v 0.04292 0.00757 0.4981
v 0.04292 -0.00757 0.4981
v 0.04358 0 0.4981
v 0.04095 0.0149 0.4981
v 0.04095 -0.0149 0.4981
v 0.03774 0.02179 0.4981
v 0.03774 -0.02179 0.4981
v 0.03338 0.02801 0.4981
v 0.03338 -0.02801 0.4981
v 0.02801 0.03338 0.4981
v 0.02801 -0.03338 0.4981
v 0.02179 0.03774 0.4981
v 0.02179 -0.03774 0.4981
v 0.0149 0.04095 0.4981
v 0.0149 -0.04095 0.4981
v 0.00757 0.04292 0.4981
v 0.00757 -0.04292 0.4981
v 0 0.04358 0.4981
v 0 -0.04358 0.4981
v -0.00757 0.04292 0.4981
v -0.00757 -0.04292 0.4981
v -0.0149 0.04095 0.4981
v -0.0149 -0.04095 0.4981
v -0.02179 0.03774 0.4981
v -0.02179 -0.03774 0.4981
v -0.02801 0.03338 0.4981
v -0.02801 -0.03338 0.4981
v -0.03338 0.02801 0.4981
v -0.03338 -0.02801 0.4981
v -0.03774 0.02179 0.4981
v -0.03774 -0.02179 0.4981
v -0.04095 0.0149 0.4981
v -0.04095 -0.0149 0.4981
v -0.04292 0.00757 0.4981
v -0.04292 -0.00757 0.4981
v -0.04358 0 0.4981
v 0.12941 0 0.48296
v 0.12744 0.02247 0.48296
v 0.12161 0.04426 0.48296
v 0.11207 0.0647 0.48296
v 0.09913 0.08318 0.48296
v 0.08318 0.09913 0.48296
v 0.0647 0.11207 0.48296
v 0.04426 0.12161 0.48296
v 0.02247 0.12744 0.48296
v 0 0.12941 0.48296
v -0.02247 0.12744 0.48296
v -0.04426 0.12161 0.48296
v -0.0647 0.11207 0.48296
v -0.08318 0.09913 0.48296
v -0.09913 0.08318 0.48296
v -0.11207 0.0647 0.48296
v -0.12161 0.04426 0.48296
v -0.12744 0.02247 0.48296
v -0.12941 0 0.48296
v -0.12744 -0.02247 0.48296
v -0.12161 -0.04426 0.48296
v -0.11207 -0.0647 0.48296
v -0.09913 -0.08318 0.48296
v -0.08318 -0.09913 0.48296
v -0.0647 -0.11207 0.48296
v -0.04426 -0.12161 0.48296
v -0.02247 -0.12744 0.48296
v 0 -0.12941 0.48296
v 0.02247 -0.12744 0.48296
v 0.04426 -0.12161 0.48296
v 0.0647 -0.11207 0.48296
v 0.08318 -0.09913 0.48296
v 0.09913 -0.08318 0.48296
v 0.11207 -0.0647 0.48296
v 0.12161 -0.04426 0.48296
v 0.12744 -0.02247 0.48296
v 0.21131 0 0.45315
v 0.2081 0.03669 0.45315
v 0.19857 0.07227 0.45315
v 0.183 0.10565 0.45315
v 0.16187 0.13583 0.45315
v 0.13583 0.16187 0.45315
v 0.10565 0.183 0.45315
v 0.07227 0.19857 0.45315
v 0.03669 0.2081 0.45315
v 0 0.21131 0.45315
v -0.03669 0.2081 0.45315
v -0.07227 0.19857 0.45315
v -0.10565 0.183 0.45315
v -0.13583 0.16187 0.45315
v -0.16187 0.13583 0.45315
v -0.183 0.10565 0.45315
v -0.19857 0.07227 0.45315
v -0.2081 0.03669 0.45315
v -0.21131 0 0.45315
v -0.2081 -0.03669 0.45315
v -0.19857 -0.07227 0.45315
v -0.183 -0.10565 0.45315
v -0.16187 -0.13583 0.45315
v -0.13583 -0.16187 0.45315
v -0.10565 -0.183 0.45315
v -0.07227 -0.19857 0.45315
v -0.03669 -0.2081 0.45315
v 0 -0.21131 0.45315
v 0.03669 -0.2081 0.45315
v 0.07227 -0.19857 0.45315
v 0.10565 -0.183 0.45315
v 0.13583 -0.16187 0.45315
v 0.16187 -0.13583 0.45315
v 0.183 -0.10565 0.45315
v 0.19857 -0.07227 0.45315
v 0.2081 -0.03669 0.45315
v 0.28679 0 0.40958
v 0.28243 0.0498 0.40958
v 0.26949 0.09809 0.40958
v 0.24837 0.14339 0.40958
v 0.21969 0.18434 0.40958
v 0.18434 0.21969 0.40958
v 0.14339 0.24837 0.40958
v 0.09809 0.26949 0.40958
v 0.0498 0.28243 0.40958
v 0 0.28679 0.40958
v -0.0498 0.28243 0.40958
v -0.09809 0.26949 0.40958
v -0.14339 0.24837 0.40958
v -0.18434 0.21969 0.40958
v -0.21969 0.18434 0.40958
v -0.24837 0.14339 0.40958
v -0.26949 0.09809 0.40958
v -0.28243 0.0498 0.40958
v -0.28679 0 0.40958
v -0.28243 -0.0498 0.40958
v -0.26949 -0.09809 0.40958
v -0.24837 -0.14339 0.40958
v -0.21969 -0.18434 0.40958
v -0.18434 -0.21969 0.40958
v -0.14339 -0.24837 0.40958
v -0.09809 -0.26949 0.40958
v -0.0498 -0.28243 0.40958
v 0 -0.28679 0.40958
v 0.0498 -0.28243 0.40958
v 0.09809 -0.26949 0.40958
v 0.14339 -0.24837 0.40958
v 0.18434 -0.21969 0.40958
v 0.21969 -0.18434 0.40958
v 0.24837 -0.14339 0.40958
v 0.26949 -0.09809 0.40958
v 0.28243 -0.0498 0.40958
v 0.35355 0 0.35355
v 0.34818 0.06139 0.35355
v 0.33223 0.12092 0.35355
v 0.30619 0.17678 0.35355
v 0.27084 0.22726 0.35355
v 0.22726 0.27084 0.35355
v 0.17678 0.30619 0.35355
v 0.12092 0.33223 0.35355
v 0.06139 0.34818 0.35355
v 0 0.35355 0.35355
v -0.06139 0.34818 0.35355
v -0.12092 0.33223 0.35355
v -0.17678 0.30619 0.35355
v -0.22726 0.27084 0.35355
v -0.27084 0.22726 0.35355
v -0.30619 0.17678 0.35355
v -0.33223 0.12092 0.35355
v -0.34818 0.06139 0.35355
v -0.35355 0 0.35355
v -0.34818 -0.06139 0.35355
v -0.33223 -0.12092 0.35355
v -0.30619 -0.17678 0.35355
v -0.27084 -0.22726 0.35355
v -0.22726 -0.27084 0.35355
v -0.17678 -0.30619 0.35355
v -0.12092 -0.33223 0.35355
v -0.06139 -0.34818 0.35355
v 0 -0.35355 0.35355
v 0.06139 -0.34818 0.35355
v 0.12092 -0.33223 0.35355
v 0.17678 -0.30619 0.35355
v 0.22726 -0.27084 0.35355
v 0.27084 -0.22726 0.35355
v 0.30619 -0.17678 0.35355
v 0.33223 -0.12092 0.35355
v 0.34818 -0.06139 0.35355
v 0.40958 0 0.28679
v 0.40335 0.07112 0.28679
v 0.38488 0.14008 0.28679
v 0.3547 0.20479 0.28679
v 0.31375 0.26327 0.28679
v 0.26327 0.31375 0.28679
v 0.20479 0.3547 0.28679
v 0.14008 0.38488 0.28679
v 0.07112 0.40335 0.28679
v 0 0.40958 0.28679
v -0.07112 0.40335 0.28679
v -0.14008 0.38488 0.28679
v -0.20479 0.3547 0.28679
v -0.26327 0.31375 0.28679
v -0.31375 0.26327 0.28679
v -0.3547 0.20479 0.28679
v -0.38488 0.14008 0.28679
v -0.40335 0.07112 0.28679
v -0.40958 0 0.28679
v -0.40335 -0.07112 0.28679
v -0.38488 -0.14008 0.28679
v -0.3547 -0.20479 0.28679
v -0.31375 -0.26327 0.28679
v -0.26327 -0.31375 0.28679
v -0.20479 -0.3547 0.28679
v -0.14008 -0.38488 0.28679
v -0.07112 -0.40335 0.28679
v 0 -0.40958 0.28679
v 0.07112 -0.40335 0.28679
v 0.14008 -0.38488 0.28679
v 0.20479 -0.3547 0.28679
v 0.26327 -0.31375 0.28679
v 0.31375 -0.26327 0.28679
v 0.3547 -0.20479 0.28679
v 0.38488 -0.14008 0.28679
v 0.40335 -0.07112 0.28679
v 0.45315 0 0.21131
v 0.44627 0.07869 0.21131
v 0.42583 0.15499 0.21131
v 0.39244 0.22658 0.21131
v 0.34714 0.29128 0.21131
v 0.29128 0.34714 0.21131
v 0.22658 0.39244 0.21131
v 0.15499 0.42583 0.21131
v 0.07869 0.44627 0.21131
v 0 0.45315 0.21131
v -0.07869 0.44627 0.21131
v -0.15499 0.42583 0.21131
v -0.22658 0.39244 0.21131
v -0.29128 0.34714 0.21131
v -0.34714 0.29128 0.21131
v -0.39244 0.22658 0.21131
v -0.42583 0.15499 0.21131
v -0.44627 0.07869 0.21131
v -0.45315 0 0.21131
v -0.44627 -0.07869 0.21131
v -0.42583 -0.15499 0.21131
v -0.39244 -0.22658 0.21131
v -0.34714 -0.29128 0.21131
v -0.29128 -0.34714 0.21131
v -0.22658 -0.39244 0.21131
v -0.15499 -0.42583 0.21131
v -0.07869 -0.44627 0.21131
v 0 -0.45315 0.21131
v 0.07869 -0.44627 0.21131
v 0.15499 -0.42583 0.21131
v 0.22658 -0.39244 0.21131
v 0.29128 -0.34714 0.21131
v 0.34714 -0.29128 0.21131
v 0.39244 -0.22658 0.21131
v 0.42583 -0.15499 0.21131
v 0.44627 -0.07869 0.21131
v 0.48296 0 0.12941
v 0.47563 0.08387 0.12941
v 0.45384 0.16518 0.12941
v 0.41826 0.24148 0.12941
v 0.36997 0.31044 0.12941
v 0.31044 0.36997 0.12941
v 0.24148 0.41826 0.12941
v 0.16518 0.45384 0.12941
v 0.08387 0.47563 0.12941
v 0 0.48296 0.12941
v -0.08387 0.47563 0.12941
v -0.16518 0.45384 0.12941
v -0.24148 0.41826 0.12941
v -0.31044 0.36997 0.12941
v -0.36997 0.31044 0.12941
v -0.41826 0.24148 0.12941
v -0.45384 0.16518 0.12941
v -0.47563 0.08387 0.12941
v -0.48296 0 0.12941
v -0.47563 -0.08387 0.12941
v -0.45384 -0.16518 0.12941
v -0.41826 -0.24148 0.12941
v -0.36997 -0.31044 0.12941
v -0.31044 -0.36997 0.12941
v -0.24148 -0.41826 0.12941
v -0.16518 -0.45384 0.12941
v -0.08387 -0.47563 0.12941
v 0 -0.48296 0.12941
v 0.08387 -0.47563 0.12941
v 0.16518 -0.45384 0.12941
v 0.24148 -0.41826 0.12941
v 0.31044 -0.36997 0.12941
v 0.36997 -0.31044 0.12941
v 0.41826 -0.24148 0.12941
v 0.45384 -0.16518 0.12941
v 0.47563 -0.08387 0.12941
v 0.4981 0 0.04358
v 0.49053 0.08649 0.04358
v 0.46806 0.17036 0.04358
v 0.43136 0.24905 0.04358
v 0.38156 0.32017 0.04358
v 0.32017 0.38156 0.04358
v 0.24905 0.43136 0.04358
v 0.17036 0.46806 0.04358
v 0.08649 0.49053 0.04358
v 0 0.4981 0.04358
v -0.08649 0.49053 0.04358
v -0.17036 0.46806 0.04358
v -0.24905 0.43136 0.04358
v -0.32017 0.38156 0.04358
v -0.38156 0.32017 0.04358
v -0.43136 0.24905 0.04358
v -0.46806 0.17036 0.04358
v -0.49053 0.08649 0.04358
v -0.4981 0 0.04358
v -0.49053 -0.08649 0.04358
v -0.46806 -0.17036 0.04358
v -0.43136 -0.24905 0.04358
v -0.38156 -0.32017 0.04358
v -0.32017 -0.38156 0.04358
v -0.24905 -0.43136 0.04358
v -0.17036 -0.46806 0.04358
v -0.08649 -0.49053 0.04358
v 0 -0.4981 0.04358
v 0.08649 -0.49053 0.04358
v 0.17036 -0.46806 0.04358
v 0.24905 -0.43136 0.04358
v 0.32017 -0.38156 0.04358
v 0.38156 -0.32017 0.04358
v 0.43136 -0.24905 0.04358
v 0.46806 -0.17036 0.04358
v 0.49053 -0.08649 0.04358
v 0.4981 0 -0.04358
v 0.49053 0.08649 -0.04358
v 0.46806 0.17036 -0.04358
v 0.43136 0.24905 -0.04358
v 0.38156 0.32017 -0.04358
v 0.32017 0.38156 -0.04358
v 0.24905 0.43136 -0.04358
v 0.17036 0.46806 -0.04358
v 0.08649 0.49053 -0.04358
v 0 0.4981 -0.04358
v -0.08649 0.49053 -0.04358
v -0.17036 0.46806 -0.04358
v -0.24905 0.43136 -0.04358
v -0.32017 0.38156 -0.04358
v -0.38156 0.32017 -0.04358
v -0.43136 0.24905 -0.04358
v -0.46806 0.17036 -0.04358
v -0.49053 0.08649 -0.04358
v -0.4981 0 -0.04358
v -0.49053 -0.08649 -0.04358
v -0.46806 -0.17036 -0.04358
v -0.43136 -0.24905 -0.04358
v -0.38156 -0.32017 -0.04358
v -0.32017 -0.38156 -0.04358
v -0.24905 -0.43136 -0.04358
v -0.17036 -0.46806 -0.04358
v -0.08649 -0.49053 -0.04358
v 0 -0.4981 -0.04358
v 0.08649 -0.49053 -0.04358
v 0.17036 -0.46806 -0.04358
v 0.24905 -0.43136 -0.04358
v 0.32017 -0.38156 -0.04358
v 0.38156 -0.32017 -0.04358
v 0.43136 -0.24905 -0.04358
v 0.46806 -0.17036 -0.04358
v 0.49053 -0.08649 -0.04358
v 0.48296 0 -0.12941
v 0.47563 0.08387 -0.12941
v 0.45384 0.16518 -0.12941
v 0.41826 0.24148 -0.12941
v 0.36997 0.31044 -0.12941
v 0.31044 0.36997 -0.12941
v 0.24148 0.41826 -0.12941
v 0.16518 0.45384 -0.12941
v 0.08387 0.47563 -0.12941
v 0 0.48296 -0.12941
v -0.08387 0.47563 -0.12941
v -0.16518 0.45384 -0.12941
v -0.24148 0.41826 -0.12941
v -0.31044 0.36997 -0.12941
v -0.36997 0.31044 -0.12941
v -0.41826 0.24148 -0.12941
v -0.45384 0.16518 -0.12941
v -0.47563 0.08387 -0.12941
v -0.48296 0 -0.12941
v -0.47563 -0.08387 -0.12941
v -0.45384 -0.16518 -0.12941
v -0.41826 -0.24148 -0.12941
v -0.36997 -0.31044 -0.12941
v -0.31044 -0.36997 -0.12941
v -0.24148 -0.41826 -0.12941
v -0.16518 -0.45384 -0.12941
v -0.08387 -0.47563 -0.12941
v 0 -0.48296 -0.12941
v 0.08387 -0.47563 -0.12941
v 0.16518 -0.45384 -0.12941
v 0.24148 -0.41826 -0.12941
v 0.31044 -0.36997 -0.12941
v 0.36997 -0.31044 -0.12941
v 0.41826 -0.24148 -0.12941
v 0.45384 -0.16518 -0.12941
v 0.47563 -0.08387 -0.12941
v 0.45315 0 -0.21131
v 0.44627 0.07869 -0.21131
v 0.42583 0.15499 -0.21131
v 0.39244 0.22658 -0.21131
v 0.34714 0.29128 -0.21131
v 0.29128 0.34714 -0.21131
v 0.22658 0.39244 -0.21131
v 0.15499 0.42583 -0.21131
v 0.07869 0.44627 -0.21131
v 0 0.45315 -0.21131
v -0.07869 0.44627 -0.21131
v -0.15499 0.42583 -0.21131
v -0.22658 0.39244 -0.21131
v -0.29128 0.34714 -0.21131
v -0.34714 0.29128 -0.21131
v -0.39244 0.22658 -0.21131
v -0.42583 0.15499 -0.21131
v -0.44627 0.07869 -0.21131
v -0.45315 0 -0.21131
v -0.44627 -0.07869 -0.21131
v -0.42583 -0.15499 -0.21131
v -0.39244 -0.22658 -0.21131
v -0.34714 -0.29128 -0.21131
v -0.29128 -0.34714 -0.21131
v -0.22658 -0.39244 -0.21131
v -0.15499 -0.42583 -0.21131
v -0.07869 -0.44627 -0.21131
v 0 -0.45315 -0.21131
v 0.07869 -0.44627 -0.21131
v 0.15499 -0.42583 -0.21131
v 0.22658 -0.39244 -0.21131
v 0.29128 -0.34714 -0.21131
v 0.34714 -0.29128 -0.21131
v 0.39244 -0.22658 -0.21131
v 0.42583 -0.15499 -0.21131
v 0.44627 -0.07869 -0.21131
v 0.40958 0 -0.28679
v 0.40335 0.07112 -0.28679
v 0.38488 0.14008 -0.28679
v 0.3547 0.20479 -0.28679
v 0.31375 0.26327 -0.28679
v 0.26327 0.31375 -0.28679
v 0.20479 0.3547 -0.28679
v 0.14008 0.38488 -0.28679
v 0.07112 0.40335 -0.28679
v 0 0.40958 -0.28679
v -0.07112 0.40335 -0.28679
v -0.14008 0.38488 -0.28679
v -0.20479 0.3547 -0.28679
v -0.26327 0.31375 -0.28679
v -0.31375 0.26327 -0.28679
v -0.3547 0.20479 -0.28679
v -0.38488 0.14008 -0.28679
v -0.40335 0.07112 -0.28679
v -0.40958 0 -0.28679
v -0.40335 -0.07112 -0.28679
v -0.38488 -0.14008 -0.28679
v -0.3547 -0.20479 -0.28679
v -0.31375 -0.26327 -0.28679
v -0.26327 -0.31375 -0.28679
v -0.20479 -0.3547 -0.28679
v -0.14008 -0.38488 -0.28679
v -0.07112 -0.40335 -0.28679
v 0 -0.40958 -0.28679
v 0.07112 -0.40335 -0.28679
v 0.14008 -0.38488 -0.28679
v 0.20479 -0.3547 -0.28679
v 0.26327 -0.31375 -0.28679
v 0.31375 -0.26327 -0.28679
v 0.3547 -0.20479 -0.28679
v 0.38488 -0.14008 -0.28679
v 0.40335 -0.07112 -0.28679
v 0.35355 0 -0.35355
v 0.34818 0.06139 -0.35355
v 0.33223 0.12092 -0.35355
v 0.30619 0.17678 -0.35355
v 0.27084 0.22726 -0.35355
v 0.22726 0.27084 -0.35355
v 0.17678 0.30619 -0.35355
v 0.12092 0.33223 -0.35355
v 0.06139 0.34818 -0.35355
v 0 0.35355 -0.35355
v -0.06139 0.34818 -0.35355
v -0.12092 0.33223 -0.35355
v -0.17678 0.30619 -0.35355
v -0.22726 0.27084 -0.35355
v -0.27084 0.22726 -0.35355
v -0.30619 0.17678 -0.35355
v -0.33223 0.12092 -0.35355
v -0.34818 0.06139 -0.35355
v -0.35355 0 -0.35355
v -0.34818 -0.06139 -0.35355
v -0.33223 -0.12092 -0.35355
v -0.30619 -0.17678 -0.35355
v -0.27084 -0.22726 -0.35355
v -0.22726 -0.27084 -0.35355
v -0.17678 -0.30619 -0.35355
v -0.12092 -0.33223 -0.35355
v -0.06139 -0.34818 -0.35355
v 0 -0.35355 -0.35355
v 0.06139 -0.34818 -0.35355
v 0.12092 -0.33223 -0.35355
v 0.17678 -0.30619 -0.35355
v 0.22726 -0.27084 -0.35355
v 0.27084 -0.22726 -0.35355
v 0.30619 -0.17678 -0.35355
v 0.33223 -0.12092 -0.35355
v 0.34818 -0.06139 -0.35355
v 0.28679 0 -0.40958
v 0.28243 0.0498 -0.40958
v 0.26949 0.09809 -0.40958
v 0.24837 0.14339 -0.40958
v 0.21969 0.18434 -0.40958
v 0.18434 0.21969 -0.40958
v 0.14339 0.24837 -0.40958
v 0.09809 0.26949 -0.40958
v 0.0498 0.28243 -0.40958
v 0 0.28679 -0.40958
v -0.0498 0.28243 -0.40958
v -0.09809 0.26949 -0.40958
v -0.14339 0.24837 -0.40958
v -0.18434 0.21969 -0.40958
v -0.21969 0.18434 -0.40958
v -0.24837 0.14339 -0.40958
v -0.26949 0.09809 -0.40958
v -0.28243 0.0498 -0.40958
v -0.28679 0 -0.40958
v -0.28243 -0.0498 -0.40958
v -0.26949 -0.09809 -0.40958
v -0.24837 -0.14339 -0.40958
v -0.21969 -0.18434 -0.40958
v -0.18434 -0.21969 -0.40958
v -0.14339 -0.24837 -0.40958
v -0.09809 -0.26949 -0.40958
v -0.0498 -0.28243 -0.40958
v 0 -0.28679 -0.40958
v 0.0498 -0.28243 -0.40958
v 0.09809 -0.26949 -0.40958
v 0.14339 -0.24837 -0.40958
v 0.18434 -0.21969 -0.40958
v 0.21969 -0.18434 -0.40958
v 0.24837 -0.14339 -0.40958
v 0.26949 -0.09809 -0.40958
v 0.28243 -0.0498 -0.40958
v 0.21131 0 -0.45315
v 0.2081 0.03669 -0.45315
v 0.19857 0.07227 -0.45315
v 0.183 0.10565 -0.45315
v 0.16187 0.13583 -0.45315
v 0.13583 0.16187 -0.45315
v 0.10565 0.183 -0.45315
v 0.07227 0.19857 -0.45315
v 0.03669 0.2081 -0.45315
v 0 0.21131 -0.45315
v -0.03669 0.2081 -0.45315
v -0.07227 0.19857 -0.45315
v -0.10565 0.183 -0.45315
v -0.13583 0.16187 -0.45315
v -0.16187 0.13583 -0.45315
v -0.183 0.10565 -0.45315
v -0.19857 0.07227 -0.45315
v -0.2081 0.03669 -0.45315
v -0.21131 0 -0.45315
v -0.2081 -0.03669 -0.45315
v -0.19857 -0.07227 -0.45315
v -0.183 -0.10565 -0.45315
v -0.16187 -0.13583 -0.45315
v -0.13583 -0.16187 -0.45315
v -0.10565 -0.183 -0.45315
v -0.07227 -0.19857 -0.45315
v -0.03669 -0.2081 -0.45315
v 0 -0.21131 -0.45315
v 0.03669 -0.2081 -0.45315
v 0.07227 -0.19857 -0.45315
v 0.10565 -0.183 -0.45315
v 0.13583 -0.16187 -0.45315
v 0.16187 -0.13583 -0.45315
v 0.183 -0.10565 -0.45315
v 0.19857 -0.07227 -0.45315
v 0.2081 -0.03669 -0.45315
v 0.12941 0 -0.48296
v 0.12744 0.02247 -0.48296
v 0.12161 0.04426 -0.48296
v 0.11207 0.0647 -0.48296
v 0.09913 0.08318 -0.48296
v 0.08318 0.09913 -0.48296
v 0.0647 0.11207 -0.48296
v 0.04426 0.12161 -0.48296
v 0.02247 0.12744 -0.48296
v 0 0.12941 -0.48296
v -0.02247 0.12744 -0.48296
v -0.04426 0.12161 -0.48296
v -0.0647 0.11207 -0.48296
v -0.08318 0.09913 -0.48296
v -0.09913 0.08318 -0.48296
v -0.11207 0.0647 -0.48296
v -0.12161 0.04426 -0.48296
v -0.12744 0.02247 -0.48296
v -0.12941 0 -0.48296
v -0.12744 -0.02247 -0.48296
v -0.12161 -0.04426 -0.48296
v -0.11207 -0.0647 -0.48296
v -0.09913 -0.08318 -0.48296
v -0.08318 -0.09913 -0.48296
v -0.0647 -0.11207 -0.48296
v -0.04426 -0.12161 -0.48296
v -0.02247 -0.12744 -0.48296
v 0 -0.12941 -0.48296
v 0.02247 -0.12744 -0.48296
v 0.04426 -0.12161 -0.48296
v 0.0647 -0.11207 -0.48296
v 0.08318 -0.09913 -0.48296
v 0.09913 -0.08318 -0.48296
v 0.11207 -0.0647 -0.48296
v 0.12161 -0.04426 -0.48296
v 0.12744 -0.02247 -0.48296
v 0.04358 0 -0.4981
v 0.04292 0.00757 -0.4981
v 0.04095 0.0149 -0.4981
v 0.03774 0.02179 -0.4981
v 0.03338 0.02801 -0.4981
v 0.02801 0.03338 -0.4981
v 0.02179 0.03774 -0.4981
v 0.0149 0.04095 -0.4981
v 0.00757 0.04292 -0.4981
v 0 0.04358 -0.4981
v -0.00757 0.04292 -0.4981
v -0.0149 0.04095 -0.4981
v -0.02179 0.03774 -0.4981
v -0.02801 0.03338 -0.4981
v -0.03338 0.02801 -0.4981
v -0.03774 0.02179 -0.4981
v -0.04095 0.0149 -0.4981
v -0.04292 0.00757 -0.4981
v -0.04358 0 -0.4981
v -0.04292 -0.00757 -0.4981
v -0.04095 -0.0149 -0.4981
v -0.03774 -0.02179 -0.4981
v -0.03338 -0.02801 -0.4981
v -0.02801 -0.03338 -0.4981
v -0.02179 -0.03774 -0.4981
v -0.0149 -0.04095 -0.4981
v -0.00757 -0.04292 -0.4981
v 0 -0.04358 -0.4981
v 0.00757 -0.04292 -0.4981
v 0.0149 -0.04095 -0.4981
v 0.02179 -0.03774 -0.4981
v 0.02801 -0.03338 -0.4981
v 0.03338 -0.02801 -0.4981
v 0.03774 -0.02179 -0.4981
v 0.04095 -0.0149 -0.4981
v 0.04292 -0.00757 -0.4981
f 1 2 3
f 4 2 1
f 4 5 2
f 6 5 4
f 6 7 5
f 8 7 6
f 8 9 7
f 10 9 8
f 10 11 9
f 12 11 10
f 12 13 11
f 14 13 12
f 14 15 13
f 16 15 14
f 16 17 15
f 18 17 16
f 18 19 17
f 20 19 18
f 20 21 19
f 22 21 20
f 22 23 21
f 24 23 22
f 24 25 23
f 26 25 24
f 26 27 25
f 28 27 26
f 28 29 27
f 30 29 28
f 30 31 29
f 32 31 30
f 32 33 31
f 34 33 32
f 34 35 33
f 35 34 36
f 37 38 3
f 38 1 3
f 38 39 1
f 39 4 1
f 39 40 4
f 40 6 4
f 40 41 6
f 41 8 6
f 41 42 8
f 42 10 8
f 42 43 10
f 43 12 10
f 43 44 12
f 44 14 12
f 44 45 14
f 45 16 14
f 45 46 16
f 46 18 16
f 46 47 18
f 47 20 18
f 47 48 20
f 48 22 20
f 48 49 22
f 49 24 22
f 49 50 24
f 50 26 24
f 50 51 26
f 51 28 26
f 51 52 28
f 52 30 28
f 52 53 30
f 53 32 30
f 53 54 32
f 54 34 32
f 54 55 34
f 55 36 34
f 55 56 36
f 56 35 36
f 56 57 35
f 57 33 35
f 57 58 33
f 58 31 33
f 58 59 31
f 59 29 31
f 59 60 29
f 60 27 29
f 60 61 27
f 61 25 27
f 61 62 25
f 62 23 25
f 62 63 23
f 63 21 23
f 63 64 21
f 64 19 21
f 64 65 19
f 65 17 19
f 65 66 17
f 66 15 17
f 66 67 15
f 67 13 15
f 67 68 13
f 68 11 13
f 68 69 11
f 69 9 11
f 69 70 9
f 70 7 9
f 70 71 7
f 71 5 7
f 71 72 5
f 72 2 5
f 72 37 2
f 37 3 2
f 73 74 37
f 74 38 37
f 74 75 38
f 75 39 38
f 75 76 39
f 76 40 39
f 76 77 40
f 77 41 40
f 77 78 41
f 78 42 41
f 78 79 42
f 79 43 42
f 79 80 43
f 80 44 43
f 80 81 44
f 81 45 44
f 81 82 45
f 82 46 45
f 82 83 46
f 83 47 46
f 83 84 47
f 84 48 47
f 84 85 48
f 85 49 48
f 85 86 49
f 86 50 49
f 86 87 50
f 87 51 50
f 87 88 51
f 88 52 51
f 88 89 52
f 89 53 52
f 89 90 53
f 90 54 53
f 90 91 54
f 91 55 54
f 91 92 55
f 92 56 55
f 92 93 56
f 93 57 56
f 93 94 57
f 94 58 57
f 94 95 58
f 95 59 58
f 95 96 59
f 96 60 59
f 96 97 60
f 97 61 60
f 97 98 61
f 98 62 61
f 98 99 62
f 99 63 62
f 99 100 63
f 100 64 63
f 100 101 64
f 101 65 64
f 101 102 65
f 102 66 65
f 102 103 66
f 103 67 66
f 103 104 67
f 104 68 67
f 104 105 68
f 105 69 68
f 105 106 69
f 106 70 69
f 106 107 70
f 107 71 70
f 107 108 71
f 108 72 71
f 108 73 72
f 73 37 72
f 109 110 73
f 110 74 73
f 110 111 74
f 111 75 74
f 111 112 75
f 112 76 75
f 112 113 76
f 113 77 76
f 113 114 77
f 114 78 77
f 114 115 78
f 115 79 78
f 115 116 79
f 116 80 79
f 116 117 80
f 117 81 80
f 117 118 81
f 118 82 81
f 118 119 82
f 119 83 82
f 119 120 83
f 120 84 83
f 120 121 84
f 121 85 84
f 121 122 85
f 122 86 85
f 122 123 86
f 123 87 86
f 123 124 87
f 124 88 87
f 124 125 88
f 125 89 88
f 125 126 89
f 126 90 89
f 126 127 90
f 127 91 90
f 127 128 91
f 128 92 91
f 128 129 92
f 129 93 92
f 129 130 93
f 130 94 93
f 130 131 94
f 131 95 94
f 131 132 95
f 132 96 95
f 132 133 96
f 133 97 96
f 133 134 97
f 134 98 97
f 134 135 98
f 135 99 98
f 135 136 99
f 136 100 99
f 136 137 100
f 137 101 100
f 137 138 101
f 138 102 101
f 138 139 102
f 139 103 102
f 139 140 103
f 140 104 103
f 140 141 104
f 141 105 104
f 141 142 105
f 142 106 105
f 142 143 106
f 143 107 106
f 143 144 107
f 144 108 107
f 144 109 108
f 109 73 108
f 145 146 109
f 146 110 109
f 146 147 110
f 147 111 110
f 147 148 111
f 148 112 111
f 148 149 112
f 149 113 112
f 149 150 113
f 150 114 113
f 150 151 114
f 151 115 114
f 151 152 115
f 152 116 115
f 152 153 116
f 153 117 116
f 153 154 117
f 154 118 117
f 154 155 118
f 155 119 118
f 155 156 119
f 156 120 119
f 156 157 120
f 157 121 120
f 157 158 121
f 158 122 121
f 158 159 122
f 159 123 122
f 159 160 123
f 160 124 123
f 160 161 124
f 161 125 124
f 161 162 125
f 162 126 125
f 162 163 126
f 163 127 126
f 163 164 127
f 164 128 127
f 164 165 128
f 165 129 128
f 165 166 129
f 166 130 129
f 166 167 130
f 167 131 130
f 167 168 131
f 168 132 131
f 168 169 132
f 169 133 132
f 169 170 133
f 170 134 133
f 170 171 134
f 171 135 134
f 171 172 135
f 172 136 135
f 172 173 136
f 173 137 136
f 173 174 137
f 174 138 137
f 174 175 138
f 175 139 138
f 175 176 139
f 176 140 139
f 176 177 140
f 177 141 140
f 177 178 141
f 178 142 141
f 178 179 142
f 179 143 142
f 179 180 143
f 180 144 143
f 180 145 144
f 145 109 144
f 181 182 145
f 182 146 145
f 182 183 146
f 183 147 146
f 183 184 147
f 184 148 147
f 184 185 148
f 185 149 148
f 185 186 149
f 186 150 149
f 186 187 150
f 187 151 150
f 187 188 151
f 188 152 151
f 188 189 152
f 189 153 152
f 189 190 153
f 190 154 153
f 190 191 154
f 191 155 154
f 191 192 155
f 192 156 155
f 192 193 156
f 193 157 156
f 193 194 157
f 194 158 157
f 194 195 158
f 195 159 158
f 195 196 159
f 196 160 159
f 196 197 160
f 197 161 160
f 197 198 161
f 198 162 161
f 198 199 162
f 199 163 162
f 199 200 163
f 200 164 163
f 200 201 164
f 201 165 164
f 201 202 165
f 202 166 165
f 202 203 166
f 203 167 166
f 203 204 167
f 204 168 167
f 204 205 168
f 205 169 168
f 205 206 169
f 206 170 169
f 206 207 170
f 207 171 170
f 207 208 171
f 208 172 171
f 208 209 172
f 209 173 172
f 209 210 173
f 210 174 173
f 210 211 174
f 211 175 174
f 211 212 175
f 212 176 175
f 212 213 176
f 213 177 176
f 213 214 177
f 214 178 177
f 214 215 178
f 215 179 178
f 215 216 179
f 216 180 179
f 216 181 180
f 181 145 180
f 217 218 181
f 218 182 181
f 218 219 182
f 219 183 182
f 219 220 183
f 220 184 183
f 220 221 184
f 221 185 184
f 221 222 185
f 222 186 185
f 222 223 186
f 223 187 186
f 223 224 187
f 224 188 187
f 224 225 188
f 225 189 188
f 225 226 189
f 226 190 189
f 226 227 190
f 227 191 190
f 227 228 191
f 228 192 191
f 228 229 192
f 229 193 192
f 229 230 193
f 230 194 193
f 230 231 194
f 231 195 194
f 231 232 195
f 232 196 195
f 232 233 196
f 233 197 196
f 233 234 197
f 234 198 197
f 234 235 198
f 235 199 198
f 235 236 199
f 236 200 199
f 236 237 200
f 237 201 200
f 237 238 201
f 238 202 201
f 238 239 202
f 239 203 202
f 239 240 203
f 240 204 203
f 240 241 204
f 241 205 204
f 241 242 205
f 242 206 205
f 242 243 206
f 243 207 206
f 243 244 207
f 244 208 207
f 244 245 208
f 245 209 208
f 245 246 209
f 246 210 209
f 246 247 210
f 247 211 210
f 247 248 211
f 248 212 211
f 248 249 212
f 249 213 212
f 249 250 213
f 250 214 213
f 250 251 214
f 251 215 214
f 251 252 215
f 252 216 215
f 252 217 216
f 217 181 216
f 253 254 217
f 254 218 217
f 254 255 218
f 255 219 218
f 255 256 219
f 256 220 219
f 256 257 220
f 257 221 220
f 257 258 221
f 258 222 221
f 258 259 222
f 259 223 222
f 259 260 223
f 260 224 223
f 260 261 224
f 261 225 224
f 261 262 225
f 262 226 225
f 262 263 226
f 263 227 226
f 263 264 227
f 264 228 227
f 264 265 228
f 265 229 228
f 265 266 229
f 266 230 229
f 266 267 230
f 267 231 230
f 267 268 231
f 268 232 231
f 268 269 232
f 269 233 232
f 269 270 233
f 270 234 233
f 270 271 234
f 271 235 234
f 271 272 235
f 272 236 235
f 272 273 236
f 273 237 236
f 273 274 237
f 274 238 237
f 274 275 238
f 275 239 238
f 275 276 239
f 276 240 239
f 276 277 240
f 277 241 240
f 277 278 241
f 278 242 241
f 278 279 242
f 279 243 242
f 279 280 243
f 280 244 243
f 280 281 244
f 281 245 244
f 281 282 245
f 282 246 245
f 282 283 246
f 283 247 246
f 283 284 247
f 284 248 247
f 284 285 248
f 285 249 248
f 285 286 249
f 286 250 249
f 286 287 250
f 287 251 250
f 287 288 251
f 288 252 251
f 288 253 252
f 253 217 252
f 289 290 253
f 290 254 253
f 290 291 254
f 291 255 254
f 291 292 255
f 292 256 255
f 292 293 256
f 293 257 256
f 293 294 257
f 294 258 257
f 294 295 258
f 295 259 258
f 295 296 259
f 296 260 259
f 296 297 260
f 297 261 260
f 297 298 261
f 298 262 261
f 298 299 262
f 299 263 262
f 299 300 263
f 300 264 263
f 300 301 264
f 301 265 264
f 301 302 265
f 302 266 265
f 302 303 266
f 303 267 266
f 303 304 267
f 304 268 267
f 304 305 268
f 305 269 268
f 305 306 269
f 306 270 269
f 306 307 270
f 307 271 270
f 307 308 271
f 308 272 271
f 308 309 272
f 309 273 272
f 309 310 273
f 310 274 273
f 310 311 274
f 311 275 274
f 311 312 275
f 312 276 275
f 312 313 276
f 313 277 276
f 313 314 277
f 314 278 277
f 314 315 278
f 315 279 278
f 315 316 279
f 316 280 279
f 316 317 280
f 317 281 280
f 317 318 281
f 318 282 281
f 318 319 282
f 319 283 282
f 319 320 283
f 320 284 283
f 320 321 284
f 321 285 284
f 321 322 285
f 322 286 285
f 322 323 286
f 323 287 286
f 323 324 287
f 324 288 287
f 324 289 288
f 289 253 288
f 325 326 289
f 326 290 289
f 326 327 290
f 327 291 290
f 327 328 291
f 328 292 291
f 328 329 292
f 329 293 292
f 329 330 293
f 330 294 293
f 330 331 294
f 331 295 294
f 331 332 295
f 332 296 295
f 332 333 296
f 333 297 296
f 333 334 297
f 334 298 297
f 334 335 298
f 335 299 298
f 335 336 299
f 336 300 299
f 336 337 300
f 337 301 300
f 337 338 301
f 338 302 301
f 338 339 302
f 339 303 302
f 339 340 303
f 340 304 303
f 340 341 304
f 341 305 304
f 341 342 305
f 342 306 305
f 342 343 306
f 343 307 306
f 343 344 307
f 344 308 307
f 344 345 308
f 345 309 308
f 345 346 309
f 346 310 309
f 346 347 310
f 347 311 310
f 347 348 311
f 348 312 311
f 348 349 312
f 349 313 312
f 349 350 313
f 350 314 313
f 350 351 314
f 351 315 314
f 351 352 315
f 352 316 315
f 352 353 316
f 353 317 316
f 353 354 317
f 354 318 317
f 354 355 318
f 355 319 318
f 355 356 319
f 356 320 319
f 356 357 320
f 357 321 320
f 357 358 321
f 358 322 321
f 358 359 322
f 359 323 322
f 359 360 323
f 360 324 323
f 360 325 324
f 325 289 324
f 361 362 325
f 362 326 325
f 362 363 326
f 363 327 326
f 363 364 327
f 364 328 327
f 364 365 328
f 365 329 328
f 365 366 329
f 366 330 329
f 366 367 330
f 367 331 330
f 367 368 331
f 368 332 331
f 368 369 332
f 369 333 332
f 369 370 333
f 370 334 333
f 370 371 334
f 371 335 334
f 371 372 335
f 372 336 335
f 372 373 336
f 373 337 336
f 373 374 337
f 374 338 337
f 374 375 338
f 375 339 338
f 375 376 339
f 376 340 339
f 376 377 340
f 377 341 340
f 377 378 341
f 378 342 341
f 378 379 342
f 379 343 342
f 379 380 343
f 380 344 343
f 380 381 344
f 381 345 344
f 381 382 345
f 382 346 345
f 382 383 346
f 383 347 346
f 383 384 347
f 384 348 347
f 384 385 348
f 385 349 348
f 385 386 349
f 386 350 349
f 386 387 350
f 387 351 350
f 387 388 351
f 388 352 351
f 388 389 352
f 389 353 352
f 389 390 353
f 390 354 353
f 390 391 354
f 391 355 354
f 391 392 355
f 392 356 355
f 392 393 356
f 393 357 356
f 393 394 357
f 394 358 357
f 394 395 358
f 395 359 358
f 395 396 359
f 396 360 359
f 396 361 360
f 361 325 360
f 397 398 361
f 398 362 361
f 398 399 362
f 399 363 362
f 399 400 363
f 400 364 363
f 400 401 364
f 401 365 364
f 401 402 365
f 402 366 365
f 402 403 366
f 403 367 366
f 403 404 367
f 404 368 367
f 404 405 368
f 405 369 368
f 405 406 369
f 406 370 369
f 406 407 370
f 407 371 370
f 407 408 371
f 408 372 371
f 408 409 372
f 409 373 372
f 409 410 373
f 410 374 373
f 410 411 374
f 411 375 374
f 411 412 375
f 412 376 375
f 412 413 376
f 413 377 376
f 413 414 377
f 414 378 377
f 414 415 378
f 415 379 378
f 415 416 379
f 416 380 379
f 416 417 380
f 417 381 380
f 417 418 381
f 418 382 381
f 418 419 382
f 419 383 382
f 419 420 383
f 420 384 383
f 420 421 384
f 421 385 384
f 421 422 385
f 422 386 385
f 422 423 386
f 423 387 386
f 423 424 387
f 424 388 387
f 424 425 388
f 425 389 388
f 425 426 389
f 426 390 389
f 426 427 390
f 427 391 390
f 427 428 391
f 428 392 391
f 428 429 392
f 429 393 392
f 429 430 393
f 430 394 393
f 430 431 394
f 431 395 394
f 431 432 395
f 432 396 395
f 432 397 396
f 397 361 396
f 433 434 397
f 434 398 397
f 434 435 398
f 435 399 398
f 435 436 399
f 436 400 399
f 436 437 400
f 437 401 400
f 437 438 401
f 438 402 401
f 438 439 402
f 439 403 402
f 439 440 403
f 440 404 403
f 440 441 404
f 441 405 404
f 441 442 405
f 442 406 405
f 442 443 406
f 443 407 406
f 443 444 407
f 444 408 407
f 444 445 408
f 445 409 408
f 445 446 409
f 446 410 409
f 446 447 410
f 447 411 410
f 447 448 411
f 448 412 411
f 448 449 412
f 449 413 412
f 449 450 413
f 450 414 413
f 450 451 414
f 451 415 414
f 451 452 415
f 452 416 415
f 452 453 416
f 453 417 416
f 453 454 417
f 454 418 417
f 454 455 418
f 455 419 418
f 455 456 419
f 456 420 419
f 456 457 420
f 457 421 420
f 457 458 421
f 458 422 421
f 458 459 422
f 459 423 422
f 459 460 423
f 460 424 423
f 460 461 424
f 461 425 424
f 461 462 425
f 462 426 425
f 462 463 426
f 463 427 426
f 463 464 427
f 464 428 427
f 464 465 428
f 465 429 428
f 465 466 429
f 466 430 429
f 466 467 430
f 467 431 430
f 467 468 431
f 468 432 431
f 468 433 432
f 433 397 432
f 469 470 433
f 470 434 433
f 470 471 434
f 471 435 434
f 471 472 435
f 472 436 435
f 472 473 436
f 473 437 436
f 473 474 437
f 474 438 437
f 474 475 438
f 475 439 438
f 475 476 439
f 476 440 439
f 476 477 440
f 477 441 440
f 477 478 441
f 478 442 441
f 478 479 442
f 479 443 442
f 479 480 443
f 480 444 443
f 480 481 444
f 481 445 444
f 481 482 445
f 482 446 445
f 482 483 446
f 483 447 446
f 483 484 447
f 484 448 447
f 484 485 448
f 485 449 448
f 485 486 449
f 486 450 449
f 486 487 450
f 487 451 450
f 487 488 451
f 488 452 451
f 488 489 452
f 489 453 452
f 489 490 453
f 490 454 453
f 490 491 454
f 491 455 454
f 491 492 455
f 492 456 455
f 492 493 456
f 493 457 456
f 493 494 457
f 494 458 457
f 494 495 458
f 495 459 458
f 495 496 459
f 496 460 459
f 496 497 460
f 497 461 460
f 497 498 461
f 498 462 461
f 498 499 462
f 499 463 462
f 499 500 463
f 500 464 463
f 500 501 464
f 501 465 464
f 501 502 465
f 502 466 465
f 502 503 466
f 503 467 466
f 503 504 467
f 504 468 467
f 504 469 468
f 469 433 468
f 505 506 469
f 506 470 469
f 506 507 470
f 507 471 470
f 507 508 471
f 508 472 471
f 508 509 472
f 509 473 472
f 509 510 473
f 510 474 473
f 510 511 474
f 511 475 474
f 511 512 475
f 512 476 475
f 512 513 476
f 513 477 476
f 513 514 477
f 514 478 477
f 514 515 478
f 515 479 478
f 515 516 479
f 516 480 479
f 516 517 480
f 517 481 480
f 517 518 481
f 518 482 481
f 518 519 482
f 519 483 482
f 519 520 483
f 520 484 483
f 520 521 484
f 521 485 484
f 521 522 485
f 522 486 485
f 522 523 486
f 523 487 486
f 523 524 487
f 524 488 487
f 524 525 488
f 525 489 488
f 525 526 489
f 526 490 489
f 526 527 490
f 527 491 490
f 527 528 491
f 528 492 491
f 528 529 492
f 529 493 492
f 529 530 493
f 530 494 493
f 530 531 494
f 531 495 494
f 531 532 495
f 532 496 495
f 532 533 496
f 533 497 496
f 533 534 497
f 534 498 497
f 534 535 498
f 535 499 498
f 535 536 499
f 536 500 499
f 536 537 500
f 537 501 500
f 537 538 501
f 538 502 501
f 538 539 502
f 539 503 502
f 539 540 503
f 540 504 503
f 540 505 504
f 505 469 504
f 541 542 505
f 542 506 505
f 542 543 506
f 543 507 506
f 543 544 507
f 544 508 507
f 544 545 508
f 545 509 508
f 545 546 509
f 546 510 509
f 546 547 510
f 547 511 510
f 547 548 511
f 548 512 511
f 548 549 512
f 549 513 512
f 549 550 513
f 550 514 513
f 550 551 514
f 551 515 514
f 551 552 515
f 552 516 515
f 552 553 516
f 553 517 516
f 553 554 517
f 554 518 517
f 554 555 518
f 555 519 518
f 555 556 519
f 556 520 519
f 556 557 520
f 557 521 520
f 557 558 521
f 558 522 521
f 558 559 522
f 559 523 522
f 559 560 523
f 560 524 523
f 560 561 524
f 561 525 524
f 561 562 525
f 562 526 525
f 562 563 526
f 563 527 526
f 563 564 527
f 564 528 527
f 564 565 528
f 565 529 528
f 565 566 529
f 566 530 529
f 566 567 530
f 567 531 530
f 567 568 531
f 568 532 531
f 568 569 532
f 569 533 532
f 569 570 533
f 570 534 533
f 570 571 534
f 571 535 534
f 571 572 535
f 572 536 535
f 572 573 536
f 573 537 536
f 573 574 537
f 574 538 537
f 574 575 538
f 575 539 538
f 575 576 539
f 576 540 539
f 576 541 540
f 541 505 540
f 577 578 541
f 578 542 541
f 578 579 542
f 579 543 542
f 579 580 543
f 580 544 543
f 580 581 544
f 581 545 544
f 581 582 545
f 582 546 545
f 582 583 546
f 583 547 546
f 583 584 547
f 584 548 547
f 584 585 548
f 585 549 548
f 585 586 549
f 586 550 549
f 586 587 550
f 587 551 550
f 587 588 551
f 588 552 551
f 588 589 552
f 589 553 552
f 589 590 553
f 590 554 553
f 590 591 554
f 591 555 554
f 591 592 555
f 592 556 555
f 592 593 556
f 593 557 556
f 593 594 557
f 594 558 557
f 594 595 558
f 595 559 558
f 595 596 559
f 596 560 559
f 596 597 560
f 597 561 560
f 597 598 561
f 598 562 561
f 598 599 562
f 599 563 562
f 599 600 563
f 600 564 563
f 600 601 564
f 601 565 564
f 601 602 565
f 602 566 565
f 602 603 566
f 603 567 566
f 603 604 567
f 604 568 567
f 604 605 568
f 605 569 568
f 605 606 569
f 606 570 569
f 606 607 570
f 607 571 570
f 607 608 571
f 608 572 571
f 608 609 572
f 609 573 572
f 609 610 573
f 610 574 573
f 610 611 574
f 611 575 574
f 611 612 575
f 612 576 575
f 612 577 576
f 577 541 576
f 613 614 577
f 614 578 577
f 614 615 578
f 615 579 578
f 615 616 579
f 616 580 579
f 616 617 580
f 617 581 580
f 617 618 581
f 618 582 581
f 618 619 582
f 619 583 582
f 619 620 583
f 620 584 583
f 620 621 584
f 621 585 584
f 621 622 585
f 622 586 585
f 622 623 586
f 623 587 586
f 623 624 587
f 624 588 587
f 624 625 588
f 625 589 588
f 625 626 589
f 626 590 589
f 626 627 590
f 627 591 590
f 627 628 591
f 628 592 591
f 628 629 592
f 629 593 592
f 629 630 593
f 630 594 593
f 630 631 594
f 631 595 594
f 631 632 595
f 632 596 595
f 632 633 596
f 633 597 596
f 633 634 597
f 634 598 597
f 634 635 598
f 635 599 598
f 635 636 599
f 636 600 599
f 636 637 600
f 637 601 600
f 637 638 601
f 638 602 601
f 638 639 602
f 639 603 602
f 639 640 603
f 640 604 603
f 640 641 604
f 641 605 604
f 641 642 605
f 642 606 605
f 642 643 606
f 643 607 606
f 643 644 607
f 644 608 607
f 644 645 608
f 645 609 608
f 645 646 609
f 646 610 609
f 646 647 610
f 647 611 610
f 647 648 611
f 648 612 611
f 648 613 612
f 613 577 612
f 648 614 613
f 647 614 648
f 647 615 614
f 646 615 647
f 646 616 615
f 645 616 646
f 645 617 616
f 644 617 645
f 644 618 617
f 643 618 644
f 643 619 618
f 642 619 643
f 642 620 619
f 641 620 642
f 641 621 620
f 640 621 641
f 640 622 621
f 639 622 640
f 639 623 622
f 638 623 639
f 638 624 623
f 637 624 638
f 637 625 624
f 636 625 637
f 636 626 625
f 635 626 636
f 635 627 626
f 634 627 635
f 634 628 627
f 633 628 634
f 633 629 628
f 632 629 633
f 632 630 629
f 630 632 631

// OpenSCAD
$fn=36;

sphere(d=1);

*Rings();
*InnerSpherical();

module Rings() {
    Ring(1,0.1,0.1);
    rotate([90,0,0])
    Ring(1,0.1,0.1);
    rotate([0,90,0])
    Ring(1,0.1,0.1);
}

module InnerSpherical() {
    sphere(d=0.75);
    rotate([90,0,0])
    cylinder(d=0.1,h=1,center=true);
    rotate([0,90,0])
    cylinder(d=0.1,h=1,center=true);
    cylinder(d=0.1,h=1,center=true);
}

module InnerCubical() {
    s=0.7;

    rotate([90,0,0])
    cube([s,s,0.1],center=true);
    rotate([0,90,0])
    cube([s,s,0.1],center=true);
    cube([s,s,0.1],center=true);

    rotate([90,0,0])
    rotate([0,0,45])
    cube([s,s,0.1],center=true);
    rotate([0,90,0])
    rotate([0,0,45])
    cube([s,s,0.1],center=true);
    rotate([0,0,45])
    cube([s,s,0.1],center=true);
}

module Ring(diameter,height,thickness) {
    difference() {
        cylinder(d=diameter,h=height,center=true);
        cylinder(d=diameter-thickness,h=height+1,center=true);
    }
}
